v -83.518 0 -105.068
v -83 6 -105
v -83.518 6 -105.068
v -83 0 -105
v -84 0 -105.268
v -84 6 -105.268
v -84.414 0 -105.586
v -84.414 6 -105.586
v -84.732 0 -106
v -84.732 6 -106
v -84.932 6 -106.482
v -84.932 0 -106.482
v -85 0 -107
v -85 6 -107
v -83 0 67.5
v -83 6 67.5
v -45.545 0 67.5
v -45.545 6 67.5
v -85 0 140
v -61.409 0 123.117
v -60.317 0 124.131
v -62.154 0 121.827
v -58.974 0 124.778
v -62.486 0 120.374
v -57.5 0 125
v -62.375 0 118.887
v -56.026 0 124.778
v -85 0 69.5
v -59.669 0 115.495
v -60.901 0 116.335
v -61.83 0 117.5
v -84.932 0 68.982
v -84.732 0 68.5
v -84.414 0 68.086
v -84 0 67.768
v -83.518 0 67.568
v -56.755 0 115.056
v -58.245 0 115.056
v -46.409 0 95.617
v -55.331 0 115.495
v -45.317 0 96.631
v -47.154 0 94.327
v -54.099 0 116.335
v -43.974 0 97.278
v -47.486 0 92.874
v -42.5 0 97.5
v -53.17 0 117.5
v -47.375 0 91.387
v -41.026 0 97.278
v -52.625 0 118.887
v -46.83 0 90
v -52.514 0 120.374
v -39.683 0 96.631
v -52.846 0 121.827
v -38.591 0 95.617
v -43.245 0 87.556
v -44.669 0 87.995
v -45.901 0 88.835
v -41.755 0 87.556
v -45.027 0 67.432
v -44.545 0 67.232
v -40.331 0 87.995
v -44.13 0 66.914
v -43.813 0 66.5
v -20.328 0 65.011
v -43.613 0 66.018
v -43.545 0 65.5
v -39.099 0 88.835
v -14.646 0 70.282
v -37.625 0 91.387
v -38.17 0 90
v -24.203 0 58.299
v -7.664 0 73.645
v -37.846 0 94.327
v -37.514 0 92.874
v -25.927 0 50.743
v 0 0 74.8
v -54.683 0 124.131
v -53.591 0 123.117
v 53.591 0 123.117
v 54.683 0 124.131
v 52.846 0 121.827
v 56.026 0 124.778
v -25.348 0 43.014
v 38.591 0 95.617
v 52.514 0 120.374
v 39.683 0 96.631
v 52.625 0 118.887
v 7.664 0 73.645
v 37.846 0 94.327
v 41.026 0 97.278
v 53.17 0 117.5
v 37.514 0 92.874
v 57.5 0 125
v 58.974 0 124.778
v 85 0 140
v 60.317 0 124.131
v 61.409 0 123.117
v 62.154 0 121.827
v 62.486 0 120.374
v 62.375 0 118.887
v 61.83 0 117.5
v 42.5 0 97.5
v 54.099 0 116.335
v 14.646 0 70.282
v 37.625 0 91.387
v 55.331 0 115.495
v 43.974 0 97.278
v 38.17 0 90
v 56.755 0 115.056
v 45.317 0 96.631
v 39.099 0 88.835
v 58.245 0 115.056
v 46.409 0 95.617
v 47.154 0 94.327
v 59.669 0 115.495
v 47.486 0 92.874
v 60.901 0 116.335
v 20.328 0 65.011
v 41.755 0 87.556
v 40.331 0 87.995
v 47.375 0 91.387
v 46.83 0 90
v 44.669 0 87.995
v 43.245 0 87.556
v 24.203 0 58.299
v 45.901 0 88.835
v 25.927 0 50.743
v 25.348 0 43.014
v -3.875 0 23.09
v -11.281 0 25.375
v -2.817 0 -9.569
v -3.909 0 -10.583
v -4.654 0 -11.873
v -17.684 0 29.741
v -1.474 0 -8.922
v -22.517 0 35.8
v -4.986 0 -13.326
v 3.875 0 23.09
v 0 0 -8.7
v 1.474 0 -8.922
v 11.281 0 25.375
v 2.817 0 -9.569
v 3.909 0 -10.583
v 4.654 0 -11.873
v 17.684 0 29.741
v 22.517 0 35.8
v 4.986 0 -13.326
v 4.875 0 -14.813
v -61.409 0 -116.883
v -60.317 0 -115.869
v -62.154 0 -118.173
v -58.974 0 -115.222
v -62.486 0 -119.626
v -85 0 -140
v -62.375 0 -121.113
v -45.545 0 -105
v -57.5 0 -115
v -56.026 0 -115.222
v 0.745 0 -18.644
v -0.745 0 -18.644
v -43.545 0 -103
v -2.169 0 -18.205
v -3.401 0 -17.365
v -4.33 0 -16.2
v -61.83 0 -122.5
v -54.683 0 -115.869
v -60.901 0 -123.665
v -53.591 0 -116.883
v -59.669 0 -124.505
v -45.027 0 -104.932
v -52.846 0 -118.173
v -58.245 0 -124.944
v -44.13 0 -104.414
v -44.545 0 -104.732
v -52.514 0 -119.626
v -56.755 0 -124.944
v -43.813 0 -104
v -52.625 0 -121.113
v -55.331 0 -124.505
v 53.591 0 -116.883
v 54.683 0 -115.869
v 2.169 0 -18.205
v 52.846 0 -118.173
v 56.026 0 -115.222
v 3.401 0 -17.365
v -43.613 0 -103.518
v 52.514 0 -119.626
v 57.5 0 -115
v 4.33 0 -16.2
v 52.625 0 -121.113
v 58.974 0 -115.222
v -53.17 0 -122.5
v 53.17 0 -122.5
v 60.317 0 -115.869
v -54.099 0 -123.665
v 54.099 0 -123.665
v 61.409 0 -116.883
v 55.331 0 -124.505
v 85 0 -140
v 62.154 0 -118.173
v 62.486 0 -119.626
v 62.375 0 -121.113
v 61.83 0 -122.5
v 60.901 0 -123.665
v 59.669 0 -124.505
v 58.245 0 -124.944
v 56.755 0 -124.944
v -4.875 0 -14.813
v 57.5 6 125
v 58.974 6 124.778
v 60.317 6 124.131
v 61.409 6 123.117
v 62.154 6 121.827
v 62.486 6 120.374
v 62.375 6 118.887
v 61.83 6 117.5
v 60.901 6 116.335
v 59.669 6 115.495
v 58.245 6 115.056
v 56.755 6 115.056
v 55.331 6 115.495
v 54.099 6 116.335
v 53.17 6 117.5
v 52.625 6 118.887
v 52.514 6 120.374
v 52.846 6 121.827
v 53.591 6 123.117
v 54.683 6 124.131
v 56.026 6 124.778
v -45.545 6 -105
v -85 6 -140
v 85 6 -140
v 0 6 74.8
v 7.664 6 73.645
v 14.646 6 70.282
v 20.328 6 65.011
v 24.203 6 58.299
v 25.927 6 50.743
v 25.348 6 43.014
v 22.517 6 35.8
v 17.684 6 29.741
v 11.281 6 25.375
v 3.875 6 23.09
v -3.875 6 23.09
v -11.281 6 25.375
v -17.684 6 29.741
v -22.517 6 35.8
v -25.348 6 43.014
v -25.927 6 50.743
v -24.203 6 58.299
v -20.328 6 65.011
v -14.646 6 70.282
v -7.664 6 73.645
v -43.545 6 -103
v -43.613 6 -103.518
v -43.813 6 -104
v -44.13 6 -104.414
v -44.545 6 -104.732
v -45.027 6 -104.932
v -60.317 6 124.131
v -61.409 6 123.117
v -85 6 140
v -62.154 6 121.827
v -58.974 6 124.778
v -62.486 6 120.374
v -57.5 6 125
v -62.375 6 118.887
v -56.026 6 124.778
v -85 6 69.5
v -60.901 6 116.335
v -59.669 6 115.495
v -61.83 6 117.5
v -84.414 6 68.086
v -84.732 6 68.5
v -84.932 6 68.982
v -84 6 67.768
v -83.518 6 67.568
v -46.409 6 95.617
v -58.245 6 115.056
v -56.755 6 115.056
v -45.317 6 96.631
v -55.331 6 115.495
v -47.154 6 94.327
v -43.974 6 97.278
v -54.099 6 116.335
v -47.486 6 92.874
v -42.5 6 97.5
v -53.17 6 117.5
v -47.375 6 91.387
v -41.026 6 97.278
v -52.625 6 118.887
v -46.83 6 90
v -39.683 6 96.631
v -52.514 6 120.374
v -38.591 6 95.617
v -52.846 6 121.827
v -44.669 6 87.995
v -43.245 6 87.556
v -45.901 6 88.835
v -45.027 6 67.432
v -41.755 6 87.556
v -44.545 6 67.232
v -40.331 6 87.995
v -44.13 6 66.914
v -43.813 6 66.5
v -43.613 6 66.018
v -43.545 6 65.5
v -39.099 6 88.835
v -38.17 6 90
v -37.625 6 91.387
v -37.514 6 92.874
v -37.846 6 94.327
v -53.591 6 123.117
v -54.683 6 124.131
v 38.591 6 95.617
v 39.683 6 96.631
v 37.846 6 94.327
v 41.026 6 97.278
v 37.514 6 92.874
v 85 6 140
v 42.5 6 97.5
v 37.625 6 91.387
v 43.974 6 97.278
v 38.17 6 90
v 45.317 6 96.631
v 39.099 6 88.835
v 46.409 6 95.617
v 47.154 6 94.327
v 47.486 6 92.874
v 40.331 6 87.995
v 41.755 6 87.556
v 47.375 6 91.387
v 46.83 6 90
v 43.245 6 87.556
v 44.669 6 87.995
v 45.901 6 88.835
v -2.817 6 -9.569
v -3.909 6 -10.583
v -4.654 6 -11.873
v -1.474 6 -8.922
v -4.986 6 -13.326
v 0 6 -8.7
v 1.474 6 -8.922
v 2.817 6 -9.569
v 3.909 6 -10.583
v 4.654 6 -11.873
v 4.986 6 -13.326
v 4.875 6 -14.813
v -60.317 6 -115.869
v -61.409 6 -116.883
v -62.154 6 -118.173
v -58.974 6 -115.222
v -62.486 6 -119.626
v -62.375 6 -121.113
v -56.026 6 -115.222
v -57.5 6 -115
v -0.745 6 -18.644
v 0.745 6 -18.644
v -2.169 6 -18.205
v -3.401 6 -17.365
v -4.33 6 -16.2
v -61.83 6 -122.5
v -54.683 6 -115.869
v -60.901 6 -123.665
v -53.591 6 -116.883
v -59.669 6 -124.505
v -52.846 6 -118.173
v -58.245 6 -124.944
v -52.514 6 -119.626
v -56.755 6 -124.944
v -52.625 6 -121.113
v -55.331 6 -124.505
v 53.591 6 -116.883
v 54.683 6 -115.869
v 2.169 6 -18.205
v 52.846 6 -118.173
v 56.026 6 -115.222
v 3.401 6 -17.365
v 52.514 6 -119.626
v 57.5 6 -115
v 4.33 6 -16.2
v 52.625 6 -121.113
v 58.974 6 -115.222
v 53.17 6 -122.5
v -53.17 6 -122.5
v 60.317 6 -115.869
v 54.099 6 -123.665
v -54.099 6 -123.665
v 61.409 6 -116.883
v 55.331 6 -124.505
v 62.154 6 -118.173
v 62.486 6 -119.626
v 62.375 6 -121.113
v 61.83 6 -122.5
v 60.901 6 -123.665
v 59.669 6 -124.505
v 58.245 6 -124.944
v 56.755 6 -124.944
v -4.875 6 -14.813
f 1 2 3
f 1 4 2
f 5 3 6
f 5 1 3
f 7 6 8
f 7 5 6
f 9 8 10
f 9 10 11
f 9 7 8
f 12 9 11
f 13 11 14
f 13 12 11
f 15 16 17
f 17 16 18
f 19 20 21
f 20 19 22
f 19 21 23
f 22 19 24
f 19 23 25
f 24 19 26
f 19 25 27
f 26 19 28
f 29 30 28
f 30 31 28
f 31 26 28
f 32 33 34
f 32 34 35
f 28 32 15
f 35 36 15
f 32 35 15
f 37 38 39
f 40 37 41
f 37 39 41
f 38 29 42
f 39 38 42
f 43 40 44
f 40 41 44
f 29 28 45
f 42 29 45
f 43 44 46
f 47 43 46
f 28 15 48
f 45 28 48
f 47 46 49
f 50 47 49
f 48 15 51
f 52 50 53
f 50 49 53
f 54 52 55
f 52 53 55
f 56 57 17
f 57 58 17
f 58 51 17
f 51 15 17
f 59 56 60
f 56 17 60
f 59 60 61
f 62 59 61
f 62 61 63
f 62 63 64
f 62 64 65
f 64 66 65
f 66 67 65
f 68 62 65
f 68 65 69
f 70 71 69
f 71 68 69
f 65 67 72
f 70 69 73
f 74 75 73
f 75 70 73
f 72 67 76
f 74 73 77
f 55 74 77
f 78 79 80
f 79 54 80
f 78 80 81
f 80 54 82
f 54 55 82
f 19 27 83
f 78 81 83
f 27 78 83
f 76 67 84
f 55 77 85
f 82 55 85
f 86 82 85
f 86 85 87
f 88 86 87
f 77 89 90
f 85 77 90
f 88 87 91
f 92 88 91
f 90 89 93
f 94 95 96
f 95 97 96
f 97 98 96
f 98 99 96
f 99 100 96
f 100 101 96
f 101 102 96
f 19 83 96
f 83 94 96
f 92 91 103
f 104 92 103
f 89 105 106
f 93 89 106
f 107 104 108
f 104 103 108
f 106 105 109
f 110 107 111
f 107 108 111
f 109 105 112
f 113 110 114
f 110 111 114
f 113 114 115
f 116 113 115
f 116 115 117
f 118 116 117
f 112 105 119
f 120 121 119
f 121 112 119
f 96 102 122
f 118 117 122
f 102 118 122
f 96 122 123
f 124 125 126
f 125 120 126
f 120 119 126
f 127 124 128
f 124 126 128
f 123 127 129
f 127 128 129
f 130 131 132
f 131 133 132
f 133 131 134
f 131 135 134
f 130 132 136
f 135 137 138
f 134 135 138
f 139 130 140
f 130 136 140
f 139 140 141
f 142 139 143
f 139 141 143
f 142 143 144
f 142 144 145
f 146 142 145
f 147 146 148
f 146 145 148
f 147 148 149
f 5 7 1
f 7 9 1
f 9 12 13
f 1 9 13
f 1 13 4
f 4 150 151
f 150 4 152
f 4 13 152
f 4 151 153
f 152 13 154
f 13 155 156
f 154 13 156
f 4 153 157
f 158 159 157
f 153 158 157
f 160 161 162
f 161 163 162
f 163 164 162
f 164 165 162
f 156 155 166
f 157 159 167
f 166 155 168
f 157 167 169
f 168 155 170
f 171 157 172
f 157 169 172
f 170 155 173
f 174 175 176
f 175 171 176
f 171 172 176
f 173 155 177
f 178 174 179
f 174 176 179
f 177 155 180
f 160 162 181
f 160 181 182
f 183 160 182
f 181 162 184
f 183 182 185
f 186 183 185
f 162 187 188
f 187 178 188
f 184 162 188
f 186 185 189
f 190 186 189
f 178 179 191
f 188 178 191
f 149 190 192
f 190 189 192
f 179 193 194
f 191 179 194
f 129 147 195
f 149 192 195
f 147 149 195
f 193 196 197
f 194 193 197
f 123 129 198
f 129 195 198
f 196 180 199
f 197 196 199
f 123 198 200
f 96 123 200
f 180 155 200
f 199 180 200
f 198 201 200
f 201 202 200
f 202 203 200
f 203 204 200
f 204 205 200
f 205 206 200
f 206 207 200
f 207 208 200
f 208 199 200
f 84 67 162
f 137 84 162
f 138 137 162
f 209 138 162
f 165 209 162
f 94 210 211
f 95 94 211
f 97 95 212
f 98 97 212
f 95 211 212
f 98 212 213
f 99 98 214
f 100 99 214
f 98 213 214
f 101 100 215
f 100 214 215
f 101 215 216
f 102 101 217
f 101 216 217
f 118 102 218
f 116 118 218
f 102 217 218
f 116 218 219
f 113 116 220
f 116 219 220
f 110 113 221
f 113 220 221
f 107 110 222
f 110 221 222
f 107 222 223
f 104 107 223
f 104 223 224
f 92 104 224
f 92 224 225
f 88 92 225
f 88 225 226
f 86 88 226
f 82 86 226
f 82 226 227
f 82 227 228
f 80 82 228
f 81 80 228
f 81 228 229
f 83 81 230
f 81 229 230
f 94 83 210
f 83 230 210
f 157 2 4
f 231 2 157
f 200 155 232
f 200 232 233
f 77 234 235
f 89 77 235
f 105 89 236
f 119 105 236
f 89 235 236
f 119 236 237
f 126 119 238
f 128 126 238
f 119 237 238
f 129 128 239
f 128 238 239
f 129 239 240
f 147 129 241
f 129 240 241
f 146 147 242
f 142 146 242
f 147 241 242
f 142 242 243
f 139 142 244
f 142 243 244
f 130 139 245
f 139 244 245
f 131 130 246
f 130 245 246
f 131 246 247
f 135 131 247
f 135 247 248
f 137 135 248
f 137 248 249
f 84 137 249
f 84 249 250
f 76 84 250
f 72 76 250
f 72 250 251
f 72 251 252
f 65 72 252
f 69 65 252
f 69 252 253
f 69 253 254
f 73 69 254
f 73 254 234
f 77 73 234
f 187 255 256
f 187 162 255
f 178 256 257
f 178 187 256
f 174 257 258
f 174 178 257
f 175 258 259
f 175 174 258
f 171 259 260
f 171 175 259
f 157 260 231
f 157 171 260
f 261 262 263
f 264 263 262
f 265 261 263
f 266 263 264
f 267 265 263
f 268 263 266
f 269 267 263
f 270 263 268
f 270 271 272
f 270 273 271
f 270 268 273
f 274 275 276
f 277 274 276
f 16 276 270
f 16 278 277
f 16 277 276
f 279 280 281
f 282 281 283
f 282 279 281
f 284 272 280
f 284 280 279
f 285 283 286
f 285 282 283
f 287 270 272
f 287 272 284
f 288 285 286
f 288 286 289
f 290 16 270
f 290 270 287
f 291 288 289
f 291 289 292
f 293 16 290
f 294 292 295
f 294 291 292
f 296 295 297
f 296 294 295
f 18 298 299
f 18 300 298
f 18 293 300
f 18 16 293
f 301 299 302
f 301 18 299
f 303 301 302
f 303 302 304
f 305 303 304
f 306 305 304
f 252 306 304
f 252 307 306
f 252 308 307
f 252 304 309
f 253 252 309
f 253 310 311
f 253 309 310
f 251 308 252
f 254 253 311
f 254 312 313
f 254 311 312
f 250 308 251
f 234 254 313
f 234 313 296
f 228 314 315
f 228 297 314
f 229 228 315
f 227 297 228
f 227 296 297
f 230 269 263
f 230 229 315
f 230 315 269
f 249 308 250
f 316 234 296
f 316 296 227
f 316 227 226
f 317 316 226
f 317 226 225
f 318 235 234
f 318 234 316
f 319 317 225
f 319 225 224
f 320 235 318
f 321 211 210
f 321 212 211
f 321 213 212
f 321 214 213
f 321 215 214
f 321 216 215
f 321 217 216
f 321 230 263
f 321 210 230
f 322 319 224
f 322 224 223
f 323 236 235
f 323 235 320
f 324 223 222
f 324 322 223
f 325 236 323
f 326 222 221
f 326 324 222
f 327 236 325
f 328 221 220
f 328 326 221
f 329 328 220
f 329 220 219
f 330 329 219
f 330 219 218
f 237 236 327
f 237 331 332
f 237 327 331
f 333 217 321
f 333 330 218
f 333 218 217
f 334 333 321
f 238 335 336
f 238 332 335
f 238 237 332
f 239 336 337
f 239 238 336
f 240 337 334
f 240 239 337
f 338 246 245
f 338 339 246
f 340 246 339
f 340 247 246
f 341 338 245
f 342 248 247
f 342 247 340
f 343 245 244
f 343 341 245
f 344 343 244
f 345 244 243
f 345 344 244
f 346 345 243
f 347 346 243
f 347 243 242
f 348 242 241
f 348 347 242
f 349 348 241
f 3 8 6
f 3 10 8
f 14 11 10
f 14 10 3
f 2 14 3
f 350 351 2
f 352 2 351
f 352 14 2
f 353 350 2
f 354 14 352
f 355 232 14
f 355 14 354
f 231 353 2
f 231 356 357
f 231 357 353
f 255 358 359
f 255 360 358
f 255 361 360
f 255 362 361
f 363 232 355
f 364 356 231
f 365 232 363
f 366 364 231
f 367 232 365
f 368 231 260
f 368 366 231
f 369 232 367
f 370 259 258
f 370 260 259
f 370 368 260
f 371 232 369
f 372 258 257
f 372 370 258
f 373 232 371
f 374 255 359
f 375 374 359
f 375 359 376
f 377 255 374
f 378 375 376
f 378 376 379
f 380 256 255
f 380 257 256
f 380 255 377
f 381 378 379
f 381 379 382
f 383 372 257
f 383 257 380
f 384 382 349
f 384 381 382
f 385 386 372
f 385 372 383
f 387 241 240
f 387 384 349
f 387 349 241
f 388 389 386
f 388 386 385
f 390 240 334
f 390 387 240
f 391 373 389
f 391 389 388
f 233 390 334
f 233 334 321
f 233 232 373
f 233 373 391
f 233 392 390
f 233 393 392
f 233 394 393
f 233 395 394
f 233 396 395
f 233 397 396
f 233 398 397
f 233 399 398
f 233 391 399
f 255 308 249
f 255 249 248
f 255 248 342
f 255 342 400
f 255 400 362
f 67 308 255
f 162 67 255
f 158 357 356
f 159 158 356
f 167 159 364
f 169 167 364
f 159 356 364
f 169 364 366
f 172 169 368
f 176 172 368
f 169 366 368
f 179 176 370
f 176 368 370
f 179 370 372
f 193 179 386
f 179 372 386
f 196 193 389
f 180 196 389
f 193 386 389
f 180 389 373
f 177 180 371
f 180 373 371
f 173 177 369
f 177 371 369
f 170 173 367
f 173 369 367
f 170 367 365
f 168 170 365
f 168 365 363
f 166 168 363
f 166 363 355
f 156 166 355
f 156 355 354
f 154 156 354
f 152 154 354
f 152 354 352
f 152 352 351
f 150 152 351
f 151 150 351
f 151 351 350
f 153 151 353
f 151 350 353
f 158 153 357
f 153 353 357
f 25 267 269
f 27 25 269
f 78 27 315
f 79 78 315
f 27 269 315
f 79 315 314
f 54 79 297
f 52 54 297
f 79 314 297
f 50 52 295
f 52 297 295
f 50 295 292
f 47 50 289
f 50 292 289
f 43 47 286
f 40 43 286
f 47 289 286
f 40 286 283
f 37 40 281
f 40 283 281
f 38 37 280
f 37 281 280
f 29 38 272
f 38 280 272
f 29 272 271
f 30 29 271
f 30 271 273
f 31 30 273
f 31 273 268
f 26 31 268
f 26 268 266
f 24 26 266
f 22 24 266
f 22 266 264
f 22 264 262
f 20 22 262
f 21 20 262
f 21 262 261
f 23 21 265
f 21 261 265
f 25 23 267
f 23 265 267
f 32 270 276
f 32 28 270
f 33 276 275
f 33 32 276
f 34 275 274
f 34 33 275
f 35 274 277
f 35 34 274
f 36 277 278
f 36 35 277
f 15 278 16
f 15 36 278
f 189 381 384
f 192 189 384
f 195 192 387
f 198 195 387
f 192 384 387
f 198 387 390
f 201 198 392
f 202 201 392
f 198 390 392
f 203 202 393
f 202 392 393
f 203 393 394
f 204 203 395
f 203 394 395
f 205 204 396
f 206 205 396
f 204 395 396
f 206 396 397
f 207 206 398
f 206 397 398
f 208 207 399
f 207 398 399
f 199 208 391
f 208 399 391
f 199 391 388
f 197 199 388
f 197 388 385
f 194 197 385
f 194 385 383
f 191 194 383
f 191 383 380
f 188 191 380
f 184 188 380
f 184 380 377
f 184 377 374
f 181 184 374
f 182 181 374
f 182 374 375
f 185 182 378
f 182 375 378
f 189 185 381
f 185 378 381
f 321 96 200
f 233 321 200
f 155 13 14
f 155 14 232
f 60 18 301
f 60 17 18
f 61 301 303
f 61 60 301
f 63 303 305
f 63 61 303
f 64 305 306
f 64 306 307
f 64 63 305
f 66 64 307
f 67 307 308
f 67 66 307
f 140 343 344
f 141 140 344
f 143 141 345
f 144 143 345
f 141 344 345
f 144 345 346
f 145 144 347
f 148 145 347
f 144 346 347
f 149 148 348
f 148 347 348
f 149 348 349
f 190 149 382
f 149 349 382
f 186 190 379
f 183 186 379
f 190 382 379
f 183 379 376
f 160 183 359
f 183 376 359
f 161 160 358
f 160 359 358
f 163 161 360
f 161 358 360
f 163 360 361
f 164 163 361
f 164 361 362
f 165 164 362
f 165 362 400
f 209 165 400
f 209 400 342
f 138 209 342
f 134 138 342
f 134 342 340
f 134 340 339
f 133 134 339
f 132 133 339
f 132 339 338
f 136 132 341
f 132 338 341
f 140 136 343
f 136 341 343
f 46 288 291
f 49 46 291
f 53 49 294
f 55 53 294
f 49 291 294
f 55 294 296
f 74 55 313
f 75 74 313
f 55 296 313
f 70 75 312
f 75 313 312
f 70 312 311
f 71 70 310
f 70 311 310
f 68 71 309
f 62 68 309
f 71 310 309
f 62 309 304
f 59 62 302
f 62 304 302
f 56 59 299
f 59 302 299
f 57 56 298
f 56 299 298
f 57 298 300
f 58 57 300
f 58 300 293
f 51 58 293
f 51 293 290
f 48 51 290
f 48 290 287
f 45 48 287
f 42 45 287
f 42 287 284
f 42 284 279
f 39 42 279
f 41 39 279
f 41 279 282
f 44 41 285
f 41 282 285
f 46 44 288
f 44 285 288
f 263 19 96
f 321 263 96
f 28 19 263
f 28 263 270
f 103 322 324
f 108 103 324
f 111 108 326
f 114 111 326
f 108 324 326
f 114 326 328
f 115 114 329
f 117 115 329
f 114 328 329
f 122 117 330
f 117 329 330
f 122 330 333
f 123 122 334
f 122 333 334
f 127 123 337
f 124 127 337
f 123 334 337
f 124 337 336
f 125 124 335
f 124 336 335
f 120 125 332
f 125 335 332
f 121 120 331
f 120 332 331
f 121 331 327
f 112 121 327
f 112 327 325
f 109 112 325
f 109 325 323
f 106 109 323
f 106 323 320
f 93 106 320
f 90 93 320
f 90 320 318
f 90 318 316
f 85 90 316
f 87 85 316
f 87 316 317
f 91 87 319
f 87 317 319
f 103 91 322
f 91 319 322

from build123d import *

# Parameters (mm, degrees)
SKETCH1_W           = 170
SKETCH1_H           = 280
BOSS_EXTRUDE1_DEPTH = 6
SKETCH2_R           = 5
CUT_EXTRUDE1_DEPTH  = 6
SKETCH3_W           = 41.455389413
SKETCH3_H           = 172.5
CUT_EXTRUDE2_DEPTH  = 10
FILLET1_R           = 2
SKETCH4_R           = 26
CUT_EXTRUDE3_DEPTH  = 10


with BuildPart() as part:
    # Sketch1 → Boss-Extrude1 (new body)
    with BuildSketch(Plane(origin=(0, 0, 0), x_dir=(1, 0, 0), z_dir=(0, 1, 0))):
        Rectangle(SKETCH1_W, SKETCH1_H)
    extrude(amount=BOSS_EXTRUDE1_DEPTH)

    # Sketch2 → Cut-Extrude1 (cut)
    with BuildSketch(Plane(origin=(0, 6, 0), x_dir=(1, 0, 0), z_dir=(0, 1, 0))):
        with Locations(Location((-57.5, 120, 0), (0, 0, 270))):
            Circle(SKETCH2_R)
        with Locations(Location((57.5, 120, 0), (0, 0, 270))):
            Circle(SKETCH2_R)
        with Locations(Location((0, 13.7, 0), (0, 0, 270))):
            Circle(SKETCH2_R)
        with Locations(Location((-57.5, -120, 0), (0, 0, 270))):
            Circle(SKETCH2_R)
        with Locations(Location((57.5, -120, 0), (0, 0, 270))):
            Circle(SKETCH2_R)
        with Locations(Location((-42.5, -92.5, 0), (0, 0, 270))):
            Circle(SKETCH2_R)
        with Locations(Location((42.5, -92.5, 0), (0, 0, 270))):
            Circle(SKETCH2_R)
    extrude(amount=-CUT_EXTRUDE1_DEPTH, mode=Mode.SUBTRACT)

    # Sketch3 → Cut-Extrude2 (cut)
    with BuildSketch(Plane(origin=(0, 6, 0), x_dir=(1, 0, 0), z_dir=(0, 1, 0))):
        with Locations((-64.272305293, 18.75)):
            Rectangle(SKETCH3_W, SKETCH3_H)
    extrude(amount=-CUT_EXTRUDE2_DEPTH, mode=Mode.SUBTRACT)

    # Fillet1
    fillet1_edges = [part.edges().sort_by_distance(p)[0] for p in [
        (-43.544610587, 3, -105),
        (-43.544610587, 3, 67.5),
        (-85, 3, 67.5),
        (-85, 3, -105),
    ]]
    fillet(fillet1_edges, radius=FILLET1_R)

    # Sketch4 → Cut-Extrude3 (cut)
    with BuildSketch(Plane(origin=(0, 6, 0), x_dir=(1, 0, 0), z_dir=(0, 1, 0))):
        with Locations(Location((0, -48.8, 0), (0, 0, 270))):
            Circle(SKETCH4_R)
    extrude(amount=-CUT_EXTRUDE3_DEPTH, mode=Mode.SUBTRACT)


solid = part.part
